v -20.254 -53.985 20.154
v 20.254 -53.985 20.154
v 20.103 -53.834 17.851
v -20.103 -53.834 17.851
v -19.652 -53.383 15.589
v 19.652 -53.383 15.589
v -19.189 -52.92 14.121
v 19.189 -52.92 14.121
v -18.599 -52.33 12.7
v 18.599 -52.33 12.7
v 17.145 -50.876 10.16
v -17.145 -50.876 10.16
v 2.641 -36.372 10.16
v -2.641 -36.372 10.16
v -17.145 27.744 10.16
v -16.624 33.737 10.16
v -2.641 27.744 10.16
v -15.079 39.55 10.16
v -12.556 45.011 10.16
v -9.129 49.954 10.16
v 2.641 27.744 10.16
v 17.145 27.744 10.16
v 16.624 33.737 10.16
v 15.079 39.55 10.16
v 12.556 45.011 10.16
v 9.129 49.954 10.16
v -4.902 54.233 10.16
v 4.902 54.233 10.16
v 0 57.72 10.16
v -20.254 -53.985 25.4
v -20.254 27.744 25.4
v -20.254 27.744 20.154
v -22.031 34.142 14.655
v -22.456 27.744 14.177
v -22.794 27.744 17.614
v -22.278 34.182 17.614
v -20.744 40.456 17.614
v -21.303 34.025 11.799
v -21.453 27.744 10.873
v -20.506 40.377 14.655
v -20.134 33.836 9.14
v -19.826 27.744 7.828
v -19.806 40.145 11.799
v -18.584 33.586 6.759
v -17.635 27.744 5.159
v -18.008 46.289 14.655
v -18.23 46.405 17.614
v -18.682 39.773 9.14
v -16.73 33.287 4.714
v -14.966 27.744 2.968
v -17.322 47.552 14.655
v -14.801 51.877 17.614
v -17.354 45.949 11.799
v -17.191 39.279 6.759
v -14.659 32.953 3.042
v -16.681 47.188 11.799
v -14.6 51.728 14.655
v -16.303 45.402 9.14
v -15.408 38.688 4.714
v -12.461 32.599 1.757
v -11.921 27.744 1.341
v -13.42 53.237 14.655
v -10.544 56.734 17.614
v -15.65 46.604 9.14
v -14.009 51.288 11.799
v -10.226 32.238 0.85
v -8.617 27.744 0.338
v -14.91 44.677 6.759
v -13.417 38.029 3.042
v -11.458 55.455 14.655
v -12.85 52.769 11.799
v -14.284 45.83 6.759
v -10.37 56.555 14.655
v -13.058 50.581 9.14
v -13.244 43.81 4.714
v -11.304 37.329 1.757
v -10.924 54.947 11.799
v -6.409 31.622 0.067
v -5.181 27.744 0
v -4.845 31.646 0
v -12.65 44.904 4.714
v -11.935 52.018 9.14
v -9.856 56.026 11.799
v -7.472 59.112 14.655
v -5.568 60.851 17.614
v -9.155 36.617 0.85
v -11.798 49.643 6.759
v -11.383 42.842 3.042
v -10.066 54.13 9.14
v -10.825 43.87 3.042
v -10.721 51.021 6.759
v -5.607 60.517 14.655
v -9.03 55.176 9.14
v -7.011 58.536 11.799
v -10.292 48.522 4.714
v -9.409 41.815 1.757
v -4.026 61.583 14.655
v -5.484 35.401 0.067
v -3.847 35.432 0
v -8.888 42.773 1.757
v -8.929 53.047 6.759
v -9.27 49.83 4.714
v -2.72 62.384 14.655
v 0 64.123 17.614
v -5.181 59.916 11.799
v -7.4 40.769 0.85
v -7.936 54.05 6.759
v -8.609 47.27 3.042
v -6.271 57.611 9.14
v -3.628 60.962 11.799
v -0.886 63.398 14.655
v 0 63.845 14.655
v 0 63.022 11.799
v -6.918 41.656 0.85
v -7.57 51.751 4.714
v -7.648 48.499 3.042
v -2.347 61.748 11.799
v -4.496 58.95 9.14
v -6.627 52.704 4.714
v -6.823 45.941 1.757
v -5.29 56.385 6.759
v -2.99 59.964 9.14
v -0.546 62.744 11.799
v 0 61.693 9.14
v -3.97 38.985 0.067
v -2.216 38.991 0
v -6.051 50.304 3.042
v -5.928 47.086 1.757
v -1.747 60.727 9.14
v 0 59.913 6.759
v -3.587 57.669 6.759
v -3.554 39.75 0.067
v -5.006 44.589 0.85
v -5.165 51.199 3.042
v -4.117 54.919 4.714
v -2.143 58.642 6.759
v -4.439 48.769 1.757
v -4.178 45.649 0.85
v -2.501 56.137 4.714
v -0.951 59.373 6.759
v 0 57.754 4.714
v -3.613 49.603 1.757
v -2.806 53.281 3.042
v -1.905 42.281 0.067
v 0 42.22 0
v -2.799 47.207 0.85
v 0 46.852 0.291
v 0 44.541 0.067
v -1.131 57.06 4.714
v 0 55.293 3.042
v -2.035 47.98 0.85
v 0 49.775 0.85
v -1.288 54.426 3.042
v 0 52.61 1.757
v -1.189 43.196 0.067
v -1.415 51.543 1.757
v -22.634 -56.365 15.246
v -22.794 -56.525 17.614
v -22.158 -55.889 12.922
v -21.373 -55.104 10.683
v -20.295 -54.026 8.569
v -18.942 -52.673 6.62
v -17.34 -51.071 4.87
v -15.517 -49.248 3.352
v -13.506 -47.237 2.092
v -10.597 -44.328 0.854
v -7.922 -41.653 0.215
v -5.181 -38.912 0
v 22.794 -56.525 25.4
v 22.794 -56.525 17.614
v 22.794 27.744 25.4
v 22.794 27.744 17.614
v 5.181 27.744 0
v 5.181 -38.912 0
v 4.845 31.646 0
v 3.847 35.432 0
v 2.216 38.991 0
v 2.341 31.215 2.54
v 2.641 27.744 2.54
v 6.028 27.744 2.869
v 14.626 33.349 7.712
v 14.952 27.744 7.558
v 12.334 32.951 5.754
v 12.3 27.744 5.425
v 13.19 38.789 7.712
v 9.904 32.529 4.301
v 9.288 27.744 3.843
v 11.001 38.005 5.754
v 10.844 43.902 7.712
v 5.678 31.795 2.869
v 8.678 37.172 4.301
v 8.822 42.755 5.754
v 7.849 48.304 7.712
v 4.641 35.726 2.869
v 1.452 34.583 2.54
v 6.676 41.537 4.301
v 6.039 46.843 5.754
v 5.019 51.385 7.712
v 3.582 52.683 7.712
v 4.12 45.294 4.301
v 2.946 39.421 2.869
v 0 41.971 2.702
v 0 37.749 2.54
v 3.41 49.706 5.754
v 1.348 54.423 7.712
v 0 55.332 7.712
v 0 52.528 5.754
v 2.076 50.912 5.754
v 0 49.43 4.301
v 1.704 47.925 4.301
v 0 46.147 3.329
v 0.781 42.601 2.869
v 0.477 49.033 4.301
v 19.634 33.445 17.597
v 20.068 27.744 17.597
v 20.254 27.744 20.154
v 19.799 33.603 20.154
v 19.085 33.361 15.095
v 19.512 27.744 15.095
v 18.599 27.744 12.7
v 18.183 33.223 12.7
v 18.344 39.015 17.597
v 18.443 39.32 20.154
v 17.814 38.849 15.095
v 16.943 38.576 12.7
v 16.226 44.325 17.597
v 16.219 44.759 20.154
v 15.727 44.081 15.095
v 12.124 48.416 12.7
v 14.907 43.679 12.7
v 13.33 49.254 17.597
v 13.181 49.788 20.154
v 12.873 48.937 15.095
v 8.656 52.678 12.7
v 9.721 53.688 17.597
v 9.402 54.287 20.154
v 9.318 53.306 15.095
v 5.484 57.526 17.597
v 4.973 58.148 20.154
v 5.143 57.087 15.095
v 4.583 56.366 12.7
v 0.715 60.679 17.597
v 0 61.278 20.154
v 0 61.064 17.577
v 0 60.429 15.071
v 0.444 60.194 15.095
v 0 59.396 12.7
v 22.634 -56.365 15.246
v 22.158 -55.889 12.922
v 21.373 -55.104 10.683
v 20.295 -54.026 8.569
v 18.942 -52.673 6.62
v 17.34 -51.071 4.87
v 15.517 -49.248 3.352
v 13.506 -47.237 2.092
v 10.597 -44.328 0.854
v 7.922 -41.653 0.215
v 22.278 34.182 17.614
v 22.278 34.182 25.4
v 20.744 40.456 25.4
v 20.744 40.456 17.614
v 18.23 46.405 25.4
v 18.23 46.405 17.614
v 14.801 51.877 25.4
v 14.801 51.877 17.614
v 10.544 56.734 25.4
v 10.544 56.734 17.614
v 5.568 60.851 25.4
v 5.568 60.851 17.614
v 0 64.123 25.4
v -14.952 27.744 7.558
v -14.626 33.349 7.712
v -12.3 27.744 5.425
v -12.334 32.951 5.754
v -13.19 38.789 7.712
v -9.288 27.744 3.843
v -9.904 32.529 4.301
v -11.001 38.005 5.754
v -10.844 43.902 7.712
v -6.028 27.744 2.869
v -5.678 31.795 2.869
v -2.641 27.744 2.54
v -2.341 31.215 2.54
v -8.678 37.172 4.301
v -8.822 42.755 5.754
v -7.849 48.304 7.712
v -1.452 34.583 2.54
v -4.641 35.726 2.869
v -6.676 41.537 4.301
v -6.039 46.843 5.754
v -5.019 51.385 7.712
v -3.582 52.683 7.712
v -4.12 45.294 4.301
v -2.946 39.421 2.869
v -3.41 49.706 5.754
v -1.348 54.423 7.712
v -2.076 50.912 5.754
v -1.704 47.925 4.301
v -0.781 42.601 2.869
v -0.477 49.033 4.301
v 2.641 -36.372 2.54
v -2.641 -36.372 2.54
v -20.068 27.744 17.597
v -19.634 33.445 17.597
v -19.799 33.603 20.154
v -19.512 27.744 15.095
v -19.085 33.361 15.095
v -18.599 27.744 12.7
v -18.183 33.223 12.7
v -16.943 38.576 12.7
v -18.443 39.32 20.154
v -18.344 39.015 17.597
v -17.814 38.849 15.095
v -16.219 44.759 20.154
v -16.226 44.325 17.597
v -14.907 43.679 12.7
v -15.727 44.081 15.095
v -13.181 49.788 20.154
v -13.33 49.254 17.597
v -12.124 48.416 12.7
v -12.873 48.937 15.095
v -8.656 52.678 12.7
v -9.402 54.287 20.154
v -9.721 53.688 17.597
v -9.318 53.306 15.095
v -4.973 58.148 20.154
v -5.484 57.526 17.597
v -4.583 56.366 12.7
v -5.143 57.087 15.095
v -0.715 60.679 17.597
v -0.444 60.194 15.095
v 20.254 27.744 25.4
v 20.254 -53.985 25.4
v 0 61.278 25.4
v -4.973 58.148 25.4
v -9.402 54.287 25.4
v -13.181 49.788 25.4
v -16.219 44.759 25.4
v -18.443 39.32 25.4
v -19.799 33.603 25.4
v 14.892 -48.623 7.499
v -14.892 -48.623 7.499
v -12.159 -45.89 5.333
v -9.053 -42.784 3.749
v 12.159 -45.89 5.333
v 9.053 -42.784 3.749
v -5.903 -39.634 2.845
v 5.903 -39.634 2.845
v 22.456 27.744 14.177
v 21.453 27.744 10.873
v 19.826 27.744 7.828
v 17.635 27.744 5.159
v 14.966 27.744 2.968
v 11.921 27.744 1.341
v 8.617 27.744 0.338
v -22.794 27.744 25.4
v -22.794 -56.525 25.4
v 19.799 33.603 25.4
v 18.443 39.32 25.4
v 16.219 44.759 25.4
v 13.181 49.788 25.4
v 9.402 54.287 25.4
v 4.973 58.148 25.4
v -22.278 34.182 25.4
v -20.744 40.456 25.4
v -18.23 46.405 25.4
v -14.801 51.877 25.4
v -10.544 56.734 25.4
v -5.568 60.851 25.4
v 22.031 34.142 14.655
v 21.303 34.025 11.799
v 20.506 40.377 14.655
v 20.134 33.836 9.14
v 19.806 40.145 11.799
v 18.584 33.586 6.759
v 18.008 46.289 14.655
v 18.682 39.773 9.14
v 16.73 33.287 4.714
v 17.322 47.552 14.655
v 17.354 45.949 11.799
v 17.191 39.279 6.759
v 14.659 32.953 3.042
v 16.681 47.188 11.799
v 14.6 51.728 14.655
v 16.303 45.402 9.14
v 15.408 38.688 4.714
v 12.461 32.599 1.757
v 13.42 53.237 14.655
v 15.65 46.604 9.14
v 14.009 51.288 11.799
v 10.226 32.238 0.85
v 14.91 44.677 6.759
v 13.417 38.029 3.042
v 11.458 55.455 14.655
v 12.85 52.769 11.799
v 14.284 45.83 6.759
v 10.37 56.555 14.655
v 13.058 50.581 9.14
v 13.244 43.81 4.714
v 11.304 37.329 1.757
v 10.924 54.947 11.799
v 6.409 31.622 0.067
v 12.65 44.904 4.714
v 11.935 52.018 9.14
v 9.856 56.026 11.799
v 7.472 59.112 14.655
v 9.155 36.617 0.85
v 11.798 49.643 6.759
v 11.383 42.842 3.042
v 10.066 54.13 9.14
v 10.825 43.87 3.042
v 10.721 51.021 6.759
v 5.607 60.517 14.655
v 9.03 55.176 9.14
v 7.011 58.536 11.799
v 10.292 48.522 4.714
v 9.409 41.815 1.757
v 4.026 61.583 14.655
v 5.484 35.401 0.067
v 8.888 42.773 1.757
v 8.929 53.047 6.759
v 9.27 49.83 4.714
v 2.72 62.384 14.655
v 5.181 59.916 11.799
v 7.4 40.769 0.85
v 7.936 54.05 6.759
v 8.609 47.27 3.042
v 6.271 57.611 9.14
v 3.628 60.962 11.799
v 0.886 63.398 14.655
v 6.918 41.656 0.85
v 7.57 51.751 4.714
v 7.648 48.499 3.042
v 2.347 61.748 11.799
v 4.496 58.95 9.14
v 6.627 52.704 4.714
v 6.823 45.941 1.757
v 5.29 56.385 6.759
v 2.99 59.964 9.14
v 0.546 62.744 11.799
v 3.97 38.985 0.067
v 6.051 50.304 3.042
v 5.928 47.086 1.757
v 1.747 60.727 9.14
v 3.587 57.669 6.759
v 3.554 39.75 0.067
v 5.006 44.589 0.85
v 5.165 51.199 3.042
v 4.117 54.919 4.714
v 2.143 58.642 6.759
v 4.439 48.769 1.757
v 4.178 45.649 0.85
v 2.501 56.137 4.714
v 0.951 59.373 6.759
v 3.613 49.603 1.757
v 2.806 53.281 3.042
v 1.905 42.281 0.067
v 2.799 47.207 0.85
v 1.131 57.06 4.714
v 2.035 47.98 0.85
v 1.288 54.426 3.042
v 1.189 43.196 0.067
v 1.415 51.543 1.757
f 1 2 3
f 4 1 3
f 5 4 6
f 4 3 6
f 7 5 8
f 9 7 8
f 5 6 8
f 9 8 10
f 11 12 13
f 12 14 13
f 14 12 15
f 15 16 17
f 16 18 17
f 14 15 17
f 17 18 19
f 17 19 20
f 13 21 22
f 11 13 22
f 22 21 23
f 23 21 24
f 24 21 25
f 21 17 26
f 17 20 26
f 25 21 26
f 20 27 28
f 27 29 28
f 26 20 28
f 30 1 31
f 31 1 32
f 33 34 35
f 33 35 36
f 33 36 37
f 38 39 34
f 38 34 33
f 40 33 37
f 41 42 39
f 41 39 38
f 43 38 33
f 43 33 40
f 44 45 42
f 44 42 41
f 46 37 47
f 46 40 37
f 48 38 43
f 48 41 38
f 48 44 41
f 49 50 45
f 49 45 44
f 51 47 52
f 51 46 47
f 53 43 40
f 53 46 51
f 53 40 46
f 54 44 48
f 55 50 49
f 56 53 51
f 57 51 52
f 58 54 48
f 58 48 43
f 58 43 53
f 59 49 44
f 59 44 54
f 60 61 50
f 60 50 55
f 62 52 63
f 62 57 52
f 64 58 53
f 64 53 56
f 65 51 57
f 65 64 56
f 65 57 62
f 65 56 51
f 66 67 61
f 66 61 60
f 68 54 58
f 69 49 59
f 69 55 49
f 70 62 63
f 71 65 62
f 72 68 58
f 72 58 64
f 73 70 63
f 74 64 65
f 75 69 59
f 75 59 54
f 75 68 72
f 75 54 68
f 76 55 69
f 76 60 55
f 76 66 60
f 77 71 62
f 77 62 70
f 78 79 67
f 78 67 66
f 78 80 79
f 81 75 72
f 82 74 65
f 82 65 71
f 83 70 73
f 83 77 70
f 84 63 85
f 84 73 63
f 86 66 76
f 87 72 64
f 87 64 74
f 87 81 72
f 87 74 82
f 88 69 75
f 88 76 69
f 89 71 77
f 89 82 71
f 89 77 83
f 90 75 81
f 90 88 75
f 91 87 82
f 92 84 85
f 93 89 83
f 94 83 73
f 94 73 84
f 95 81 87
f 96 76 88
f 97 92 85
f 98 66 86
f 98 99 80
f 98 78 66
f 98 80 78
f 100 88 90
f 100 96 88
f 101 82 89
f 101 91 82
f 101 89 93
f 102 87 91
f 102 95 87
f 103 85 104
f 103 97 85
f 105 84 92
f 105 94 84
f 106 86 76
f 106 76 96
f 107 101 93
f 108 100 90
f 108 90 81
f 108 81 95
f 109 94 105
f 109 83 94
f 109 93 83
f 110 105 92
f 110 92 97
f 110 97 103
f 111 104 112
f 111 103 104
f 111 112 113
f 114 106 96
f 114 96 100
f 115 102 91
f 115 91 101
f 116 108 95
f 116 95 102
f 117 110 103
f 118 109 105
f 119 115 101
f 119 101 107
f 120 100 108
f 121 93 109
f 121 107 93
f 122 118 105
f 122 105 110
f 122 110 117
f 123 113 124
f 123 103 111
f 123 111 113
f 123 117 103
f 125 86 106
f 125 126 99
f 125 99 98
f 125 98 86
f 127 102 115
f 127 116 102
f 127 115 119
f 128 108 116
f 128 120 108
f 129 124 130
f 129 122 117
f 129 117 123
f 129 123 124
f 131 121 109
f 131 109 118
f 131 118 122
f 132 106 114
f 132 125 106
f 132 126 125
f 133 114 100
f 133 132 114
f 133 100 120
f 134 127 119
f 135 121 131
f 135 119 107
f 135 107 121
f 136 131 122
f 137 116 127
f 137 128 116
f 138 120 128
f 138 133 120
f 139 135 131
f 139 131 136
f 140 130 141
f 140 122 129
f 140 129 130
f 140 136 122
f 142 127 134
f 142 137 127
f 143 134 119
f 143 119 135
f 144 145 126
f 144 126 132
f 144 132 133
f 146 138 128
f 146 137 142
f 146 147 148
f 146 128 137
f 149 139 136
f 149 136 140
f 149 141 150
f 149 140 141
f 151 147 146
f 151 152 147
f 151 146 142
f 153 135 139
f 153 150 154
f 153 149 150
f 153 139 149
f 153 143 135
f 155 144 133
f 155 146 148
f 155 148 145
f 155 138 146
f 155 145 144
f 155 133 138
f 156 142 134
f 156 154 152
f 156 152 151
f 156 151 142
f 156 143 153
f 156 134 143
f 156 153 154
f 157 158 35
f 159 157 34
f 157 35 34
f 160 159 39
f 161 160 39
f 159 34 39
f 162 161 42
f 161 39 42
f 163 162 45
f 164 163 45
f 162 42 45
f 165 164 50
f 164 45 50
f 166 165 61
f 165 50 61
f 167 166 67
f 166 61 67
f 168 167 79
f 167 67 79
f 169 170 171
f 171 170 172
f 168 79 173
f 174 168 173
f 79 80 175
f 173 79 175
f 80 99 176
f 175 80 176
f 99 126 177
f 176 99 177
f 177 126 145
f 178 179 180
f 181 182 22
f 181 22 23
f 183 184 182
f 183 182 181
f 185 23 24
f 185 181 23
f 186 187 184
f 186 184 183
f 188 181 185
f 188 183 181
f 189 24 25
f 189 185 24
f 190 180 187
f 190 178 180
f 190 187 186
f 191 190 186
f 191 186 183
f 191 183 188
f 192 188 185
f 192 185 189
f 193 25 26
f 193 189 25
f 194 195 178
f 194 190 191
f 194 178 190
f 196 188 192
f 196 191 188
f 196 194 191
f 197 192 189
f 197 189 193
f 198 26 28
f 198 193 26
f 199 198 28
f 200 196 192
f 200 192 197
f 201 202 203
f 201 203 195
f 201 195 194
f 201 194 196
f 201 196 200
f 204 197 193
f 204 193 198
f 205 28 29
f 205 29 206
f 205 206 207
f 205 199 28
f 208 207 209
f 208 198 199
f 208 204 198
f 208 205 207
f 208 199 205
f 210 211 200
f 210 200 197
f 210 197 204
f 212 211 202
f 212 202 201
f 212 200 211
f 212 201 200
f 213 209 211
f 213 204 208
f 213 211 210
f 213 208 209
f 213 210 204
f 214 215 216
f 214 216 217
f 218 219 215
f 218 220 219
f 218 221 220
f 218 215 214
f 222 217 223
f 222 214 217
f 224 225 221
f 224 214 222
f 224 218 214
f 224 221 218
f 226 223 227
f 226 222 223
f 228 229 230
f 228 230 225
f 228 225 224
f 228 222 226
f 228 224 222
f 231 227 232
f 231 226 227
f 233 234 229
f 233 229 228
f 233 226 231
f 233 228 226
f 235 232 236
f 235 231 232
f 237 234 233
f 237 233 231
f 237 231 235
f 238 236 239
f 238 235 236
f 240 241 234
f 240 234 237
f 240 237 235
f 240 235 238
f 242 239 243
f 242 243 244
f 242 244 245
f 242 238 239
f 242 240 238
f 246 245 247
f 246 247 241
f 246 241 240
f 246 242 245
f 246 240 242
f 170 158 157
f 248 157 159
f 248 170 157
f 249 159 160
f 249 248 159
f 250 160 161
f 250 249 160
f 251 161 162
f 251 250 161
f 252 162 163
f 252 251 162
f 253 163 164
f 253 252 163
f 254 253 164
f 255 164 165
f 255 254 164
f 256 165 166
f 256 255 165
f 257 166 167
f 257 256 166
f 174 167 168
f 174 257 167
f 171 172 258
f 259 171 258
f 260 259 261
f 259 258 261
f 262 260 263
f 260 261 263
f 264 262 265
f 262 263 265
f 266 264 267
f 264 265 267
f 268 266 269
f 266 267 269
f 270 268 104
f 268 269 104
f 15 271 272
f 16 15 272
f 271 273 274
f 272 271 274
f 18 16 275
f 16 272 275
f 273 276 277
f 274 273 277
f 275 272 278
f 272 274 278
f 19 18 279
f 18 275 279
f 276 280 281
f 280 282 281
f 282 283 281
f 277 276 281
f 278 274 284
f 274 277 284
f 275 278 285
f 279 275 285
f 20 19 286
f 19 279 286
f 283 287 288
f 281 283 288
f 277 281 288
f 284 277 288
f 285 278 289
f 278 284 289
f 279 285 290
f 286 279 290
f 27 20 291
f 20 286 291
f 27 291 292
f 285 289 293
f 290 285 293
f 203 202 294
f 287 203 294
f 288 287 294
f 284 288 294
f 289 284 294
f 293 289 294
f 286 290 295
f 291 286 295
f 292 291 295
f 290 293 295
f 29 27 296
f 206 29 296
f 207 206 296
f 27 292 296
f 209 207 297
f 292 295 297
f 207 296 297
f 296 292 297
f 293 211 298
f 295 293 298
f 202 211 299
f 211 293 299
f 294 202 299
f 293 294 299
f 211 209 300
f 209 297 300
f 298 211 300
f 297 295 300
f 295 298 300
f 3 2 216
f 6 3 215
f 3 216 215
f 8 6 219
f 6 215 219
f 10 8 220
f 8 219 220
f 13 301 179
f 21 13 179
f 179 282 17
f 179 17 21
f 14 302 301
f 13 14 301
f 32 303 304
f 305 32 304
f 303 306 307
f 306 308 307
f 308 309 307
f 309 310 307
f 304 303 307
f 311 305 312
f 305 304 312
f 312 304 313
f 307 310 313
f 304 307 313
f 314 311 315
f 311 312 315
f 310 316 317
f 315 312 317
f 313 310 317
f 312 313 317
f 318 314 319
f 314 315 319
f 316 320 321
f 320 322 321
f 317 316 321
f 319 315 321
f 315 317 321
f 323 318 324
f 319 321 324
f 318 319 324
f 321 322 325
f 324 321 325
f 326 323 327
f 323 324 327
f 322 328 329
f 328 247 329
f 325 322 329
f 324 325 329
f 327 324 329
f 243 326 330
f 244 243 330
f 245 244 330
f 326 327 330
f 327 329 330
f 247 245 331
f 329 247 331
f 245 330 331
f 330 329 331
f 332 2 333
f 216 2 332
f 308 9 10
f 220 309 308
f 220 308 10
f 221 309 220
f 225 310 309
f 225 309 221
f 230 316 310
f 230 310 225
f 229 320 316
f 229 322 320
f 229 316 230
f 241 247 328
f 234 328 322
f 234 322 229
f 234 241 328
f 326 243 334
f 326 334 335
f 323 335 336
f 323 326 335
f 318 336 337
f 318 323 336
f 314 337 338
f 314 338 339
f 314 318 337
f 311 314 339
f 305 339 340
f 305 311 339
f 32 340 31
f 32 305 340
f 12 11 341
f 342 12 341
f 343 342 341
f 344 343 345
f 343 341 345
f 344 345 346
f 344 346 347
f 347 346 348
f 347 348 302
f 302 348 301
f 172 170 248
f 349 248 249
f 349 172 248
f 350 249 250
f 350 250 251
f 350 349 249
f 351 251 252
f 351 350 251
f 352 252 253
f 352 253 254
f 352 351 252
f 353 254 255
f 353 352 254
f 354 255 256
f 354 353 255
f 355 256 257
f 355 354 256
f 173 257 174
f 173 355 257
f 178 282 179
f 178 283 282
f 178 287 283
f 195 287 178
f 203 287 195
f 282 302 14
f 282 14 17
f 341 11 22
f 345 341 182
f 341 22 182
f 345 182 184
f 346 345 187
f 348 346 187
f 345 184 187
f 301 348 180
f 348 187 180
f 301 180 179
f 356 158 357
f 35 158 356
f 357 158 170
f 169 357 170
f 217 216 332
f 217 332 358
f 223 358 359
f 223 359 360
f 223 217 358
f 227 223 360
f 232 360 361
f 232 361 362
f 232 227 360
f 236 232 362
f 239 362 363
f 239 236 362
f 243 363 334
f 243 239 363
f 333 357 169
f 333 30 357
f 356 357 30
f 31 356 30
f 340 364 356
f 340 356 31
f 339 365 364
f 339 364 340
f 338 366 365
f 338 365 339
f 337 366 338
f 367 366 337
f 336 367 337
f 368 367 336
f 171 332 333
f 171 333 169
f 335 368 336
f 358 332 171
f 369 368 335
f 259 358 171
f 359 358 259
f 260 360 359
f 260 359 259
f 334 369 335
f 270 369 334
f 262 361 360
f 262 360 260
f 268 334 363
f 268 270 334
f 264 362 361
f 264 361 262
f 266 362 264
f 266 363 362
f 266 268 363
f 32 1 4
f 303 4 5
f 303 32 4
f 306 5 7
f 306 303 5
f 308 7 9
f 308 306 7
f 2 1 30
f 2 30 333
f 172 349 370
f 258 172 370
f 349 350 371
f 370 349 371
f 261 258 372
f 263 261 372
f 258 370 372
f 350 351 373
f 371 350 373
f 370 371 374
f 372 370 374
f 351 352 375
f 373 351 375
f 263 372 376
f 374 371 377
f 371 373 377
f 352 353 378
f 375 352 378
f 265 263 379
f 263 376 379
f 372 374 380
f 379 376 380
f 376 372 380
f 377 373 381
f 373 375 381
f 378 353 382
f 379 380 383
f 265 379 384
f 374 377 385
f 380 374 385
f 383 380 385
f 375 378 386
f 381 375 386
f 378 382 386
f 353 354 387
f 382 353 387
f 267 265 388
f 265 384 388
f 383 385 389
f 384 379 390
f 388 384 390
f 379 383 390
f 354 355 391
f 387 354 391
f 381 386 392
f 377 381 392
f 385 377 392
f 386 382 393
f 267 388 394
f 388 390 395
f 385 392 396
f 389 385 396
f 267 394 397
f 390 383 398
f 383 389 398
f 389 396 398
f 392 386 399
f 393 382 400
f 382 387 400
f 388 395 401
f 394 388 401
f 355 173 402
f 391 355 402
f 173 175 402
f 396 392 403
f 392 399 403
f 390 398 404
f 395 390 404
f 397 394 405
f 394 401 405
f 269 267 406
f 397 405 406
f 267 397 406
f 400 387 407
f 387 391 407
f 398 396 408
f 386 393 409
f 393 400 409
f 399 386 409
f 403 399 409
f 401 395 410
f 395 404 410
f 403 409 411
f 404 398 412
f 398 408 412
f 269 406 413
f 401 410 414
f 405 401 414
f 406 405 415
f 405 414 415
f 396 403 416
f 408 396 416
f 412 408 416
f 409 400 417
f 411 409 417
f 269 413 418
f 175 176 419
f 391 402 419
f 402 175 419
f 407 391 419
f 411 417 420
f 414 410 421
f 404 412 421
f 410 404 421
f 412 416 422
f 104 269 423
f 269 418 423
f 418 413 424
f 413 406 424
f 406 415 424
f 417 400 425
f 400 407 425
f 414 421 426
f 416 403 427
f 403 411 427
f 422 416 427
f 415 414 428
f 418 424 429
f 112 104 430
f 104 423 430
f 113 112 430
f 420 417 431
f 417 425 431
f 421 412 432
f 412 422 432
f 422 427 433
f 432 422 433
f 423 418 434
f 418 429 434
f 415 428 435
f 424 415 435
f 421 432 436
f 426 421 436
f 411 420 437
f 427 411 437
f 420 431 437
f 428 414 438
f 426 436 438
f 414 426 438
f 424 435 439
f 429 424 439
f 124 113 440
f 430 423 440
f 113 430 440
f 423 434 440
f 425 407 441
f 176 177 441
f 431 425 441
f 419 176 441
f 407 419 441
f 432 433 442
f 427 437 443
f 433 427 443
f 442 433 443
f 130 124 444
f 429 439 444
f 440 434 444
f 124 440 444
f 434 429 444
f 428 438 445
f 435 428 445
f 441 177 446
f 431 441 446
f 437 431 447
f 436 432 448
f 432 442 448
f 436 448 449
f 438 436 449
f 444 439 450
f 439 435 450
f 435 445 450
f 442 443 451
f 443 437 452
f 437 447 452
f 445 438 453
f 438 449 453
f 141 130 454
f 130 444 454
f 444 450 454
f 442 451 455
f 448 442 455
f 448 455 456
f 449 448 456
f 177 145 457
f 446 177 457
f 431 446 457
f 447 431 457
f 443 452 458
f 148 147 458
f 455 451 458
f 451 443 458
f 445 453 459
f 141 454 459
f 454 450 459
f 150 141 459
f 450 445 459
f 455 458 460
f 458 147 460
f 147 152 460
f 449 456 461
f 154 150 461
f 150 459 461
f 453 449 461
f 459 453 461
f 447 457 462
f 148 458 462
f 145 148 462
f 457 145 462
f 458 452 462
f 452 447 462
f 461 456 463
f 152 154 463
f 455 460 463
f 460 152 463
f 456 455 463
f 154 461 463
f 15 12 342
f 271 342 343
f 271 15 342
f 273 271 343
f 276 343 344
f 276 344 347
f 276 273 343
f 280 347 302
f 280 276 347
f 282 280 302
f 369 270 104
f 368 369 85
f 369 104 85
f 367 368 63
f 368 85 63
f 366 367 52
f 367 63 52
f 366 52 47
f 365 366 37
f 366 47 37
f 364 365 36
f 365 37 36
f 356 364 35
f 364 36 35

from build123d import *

# Parameters (mm, degrees)
F0_W     = 45.5884300172
F0_H     = 84.2695254833
F1_DEPTH = 25.4
F2_T     = -2.54
F3_R     = 17.6135227398
F4_W     = 5.2813845376
F4_H     = 64.1160027434
F5_DEPTH = 7.62
F6_W     = 40.5230503529
F6_H     = 81.5065950155
F7_DEPTH = 2.54


with BuildPart() as f1:
    # F0 (on Top) → F1 (new body)
    with BuildSketch(Plane.XY):
        with BuildLine():
            Line((-22.7942150086, 27.7444738895), (22.7942150086, 27.7444738895))
            ThreePointArc((22.7942150086, 27.7444738895), (16.6249298955, 49.2094594083), (0, 64.1231238842))
            ThreePointArc((0, 64.1231238842), (-16.6249298955, 49.2094594083), (-22.7942150086, 27.7444738895))
        make_face()
        with Locations((0, -14.3902888522)):
            Rectangle(F0_W, F0_H)
    extrude(amount=F1_DEPTH)

    # F2
    f2_openings = [f1.faces().sort_by_distance(p)[0] for p in [
        (0, -1.046307, 25.4),
    ]]
    offset(amount=F2_T, openings=f2_openings)

    # F3
    f3_edges = [f1.edges().sort_by_distance(p)[0] for p in [
        (-22.794215, -14.390289, 0),
        (-16.62493, 49.209459, 0),
        (20.254215, -13.120289, 2.54),
        (14.797736, 47.332252, 2.54),
        (-20.254215, -13.120289, 2.54),
        (-14.797736, 47.332252, 2.54),
        (0, -56.525052, 0),
        (0, -53.985052, 2.54),
        (22.794215, -14.390289, 0),
        (16.62493, 49.209459, 0),
    ]]
    fillet(f3_edges, radius=F3_R)

    # F4 (on face) → F5 (join)
    with BuildSketch(Plane.XY.offset(2.54)):
        with Locations((0, -4.3135274822)):
            Rectangle(F4_W, F4_H)
    extrude(amount=F5_DEPTH)

    # F6 (on face) → F7 (join)
    with BuildSketch(Plane.XY.offset(10.16)):
        with BuildLine():
            ThreePointArc((0, 61.1299425364), (-14.9602203886, 47.3308358732), (-20.4917695373, 27.7444757521))
            Line((-20.4917695373, 27.7444757521), (20.0312808156, 27.7444757521))
            ThreePointArc((20.0312808156, 27.7444757521), (14.639260036, 47.2113810244), (0, 61.1299425364))
        make_face()
        with Locations((-0.2302443609, -13.0088217556)):
            Rectangle(F6_W, F6_H)
    extrude(amount=F7_DEPTH)


solid = f1.part
